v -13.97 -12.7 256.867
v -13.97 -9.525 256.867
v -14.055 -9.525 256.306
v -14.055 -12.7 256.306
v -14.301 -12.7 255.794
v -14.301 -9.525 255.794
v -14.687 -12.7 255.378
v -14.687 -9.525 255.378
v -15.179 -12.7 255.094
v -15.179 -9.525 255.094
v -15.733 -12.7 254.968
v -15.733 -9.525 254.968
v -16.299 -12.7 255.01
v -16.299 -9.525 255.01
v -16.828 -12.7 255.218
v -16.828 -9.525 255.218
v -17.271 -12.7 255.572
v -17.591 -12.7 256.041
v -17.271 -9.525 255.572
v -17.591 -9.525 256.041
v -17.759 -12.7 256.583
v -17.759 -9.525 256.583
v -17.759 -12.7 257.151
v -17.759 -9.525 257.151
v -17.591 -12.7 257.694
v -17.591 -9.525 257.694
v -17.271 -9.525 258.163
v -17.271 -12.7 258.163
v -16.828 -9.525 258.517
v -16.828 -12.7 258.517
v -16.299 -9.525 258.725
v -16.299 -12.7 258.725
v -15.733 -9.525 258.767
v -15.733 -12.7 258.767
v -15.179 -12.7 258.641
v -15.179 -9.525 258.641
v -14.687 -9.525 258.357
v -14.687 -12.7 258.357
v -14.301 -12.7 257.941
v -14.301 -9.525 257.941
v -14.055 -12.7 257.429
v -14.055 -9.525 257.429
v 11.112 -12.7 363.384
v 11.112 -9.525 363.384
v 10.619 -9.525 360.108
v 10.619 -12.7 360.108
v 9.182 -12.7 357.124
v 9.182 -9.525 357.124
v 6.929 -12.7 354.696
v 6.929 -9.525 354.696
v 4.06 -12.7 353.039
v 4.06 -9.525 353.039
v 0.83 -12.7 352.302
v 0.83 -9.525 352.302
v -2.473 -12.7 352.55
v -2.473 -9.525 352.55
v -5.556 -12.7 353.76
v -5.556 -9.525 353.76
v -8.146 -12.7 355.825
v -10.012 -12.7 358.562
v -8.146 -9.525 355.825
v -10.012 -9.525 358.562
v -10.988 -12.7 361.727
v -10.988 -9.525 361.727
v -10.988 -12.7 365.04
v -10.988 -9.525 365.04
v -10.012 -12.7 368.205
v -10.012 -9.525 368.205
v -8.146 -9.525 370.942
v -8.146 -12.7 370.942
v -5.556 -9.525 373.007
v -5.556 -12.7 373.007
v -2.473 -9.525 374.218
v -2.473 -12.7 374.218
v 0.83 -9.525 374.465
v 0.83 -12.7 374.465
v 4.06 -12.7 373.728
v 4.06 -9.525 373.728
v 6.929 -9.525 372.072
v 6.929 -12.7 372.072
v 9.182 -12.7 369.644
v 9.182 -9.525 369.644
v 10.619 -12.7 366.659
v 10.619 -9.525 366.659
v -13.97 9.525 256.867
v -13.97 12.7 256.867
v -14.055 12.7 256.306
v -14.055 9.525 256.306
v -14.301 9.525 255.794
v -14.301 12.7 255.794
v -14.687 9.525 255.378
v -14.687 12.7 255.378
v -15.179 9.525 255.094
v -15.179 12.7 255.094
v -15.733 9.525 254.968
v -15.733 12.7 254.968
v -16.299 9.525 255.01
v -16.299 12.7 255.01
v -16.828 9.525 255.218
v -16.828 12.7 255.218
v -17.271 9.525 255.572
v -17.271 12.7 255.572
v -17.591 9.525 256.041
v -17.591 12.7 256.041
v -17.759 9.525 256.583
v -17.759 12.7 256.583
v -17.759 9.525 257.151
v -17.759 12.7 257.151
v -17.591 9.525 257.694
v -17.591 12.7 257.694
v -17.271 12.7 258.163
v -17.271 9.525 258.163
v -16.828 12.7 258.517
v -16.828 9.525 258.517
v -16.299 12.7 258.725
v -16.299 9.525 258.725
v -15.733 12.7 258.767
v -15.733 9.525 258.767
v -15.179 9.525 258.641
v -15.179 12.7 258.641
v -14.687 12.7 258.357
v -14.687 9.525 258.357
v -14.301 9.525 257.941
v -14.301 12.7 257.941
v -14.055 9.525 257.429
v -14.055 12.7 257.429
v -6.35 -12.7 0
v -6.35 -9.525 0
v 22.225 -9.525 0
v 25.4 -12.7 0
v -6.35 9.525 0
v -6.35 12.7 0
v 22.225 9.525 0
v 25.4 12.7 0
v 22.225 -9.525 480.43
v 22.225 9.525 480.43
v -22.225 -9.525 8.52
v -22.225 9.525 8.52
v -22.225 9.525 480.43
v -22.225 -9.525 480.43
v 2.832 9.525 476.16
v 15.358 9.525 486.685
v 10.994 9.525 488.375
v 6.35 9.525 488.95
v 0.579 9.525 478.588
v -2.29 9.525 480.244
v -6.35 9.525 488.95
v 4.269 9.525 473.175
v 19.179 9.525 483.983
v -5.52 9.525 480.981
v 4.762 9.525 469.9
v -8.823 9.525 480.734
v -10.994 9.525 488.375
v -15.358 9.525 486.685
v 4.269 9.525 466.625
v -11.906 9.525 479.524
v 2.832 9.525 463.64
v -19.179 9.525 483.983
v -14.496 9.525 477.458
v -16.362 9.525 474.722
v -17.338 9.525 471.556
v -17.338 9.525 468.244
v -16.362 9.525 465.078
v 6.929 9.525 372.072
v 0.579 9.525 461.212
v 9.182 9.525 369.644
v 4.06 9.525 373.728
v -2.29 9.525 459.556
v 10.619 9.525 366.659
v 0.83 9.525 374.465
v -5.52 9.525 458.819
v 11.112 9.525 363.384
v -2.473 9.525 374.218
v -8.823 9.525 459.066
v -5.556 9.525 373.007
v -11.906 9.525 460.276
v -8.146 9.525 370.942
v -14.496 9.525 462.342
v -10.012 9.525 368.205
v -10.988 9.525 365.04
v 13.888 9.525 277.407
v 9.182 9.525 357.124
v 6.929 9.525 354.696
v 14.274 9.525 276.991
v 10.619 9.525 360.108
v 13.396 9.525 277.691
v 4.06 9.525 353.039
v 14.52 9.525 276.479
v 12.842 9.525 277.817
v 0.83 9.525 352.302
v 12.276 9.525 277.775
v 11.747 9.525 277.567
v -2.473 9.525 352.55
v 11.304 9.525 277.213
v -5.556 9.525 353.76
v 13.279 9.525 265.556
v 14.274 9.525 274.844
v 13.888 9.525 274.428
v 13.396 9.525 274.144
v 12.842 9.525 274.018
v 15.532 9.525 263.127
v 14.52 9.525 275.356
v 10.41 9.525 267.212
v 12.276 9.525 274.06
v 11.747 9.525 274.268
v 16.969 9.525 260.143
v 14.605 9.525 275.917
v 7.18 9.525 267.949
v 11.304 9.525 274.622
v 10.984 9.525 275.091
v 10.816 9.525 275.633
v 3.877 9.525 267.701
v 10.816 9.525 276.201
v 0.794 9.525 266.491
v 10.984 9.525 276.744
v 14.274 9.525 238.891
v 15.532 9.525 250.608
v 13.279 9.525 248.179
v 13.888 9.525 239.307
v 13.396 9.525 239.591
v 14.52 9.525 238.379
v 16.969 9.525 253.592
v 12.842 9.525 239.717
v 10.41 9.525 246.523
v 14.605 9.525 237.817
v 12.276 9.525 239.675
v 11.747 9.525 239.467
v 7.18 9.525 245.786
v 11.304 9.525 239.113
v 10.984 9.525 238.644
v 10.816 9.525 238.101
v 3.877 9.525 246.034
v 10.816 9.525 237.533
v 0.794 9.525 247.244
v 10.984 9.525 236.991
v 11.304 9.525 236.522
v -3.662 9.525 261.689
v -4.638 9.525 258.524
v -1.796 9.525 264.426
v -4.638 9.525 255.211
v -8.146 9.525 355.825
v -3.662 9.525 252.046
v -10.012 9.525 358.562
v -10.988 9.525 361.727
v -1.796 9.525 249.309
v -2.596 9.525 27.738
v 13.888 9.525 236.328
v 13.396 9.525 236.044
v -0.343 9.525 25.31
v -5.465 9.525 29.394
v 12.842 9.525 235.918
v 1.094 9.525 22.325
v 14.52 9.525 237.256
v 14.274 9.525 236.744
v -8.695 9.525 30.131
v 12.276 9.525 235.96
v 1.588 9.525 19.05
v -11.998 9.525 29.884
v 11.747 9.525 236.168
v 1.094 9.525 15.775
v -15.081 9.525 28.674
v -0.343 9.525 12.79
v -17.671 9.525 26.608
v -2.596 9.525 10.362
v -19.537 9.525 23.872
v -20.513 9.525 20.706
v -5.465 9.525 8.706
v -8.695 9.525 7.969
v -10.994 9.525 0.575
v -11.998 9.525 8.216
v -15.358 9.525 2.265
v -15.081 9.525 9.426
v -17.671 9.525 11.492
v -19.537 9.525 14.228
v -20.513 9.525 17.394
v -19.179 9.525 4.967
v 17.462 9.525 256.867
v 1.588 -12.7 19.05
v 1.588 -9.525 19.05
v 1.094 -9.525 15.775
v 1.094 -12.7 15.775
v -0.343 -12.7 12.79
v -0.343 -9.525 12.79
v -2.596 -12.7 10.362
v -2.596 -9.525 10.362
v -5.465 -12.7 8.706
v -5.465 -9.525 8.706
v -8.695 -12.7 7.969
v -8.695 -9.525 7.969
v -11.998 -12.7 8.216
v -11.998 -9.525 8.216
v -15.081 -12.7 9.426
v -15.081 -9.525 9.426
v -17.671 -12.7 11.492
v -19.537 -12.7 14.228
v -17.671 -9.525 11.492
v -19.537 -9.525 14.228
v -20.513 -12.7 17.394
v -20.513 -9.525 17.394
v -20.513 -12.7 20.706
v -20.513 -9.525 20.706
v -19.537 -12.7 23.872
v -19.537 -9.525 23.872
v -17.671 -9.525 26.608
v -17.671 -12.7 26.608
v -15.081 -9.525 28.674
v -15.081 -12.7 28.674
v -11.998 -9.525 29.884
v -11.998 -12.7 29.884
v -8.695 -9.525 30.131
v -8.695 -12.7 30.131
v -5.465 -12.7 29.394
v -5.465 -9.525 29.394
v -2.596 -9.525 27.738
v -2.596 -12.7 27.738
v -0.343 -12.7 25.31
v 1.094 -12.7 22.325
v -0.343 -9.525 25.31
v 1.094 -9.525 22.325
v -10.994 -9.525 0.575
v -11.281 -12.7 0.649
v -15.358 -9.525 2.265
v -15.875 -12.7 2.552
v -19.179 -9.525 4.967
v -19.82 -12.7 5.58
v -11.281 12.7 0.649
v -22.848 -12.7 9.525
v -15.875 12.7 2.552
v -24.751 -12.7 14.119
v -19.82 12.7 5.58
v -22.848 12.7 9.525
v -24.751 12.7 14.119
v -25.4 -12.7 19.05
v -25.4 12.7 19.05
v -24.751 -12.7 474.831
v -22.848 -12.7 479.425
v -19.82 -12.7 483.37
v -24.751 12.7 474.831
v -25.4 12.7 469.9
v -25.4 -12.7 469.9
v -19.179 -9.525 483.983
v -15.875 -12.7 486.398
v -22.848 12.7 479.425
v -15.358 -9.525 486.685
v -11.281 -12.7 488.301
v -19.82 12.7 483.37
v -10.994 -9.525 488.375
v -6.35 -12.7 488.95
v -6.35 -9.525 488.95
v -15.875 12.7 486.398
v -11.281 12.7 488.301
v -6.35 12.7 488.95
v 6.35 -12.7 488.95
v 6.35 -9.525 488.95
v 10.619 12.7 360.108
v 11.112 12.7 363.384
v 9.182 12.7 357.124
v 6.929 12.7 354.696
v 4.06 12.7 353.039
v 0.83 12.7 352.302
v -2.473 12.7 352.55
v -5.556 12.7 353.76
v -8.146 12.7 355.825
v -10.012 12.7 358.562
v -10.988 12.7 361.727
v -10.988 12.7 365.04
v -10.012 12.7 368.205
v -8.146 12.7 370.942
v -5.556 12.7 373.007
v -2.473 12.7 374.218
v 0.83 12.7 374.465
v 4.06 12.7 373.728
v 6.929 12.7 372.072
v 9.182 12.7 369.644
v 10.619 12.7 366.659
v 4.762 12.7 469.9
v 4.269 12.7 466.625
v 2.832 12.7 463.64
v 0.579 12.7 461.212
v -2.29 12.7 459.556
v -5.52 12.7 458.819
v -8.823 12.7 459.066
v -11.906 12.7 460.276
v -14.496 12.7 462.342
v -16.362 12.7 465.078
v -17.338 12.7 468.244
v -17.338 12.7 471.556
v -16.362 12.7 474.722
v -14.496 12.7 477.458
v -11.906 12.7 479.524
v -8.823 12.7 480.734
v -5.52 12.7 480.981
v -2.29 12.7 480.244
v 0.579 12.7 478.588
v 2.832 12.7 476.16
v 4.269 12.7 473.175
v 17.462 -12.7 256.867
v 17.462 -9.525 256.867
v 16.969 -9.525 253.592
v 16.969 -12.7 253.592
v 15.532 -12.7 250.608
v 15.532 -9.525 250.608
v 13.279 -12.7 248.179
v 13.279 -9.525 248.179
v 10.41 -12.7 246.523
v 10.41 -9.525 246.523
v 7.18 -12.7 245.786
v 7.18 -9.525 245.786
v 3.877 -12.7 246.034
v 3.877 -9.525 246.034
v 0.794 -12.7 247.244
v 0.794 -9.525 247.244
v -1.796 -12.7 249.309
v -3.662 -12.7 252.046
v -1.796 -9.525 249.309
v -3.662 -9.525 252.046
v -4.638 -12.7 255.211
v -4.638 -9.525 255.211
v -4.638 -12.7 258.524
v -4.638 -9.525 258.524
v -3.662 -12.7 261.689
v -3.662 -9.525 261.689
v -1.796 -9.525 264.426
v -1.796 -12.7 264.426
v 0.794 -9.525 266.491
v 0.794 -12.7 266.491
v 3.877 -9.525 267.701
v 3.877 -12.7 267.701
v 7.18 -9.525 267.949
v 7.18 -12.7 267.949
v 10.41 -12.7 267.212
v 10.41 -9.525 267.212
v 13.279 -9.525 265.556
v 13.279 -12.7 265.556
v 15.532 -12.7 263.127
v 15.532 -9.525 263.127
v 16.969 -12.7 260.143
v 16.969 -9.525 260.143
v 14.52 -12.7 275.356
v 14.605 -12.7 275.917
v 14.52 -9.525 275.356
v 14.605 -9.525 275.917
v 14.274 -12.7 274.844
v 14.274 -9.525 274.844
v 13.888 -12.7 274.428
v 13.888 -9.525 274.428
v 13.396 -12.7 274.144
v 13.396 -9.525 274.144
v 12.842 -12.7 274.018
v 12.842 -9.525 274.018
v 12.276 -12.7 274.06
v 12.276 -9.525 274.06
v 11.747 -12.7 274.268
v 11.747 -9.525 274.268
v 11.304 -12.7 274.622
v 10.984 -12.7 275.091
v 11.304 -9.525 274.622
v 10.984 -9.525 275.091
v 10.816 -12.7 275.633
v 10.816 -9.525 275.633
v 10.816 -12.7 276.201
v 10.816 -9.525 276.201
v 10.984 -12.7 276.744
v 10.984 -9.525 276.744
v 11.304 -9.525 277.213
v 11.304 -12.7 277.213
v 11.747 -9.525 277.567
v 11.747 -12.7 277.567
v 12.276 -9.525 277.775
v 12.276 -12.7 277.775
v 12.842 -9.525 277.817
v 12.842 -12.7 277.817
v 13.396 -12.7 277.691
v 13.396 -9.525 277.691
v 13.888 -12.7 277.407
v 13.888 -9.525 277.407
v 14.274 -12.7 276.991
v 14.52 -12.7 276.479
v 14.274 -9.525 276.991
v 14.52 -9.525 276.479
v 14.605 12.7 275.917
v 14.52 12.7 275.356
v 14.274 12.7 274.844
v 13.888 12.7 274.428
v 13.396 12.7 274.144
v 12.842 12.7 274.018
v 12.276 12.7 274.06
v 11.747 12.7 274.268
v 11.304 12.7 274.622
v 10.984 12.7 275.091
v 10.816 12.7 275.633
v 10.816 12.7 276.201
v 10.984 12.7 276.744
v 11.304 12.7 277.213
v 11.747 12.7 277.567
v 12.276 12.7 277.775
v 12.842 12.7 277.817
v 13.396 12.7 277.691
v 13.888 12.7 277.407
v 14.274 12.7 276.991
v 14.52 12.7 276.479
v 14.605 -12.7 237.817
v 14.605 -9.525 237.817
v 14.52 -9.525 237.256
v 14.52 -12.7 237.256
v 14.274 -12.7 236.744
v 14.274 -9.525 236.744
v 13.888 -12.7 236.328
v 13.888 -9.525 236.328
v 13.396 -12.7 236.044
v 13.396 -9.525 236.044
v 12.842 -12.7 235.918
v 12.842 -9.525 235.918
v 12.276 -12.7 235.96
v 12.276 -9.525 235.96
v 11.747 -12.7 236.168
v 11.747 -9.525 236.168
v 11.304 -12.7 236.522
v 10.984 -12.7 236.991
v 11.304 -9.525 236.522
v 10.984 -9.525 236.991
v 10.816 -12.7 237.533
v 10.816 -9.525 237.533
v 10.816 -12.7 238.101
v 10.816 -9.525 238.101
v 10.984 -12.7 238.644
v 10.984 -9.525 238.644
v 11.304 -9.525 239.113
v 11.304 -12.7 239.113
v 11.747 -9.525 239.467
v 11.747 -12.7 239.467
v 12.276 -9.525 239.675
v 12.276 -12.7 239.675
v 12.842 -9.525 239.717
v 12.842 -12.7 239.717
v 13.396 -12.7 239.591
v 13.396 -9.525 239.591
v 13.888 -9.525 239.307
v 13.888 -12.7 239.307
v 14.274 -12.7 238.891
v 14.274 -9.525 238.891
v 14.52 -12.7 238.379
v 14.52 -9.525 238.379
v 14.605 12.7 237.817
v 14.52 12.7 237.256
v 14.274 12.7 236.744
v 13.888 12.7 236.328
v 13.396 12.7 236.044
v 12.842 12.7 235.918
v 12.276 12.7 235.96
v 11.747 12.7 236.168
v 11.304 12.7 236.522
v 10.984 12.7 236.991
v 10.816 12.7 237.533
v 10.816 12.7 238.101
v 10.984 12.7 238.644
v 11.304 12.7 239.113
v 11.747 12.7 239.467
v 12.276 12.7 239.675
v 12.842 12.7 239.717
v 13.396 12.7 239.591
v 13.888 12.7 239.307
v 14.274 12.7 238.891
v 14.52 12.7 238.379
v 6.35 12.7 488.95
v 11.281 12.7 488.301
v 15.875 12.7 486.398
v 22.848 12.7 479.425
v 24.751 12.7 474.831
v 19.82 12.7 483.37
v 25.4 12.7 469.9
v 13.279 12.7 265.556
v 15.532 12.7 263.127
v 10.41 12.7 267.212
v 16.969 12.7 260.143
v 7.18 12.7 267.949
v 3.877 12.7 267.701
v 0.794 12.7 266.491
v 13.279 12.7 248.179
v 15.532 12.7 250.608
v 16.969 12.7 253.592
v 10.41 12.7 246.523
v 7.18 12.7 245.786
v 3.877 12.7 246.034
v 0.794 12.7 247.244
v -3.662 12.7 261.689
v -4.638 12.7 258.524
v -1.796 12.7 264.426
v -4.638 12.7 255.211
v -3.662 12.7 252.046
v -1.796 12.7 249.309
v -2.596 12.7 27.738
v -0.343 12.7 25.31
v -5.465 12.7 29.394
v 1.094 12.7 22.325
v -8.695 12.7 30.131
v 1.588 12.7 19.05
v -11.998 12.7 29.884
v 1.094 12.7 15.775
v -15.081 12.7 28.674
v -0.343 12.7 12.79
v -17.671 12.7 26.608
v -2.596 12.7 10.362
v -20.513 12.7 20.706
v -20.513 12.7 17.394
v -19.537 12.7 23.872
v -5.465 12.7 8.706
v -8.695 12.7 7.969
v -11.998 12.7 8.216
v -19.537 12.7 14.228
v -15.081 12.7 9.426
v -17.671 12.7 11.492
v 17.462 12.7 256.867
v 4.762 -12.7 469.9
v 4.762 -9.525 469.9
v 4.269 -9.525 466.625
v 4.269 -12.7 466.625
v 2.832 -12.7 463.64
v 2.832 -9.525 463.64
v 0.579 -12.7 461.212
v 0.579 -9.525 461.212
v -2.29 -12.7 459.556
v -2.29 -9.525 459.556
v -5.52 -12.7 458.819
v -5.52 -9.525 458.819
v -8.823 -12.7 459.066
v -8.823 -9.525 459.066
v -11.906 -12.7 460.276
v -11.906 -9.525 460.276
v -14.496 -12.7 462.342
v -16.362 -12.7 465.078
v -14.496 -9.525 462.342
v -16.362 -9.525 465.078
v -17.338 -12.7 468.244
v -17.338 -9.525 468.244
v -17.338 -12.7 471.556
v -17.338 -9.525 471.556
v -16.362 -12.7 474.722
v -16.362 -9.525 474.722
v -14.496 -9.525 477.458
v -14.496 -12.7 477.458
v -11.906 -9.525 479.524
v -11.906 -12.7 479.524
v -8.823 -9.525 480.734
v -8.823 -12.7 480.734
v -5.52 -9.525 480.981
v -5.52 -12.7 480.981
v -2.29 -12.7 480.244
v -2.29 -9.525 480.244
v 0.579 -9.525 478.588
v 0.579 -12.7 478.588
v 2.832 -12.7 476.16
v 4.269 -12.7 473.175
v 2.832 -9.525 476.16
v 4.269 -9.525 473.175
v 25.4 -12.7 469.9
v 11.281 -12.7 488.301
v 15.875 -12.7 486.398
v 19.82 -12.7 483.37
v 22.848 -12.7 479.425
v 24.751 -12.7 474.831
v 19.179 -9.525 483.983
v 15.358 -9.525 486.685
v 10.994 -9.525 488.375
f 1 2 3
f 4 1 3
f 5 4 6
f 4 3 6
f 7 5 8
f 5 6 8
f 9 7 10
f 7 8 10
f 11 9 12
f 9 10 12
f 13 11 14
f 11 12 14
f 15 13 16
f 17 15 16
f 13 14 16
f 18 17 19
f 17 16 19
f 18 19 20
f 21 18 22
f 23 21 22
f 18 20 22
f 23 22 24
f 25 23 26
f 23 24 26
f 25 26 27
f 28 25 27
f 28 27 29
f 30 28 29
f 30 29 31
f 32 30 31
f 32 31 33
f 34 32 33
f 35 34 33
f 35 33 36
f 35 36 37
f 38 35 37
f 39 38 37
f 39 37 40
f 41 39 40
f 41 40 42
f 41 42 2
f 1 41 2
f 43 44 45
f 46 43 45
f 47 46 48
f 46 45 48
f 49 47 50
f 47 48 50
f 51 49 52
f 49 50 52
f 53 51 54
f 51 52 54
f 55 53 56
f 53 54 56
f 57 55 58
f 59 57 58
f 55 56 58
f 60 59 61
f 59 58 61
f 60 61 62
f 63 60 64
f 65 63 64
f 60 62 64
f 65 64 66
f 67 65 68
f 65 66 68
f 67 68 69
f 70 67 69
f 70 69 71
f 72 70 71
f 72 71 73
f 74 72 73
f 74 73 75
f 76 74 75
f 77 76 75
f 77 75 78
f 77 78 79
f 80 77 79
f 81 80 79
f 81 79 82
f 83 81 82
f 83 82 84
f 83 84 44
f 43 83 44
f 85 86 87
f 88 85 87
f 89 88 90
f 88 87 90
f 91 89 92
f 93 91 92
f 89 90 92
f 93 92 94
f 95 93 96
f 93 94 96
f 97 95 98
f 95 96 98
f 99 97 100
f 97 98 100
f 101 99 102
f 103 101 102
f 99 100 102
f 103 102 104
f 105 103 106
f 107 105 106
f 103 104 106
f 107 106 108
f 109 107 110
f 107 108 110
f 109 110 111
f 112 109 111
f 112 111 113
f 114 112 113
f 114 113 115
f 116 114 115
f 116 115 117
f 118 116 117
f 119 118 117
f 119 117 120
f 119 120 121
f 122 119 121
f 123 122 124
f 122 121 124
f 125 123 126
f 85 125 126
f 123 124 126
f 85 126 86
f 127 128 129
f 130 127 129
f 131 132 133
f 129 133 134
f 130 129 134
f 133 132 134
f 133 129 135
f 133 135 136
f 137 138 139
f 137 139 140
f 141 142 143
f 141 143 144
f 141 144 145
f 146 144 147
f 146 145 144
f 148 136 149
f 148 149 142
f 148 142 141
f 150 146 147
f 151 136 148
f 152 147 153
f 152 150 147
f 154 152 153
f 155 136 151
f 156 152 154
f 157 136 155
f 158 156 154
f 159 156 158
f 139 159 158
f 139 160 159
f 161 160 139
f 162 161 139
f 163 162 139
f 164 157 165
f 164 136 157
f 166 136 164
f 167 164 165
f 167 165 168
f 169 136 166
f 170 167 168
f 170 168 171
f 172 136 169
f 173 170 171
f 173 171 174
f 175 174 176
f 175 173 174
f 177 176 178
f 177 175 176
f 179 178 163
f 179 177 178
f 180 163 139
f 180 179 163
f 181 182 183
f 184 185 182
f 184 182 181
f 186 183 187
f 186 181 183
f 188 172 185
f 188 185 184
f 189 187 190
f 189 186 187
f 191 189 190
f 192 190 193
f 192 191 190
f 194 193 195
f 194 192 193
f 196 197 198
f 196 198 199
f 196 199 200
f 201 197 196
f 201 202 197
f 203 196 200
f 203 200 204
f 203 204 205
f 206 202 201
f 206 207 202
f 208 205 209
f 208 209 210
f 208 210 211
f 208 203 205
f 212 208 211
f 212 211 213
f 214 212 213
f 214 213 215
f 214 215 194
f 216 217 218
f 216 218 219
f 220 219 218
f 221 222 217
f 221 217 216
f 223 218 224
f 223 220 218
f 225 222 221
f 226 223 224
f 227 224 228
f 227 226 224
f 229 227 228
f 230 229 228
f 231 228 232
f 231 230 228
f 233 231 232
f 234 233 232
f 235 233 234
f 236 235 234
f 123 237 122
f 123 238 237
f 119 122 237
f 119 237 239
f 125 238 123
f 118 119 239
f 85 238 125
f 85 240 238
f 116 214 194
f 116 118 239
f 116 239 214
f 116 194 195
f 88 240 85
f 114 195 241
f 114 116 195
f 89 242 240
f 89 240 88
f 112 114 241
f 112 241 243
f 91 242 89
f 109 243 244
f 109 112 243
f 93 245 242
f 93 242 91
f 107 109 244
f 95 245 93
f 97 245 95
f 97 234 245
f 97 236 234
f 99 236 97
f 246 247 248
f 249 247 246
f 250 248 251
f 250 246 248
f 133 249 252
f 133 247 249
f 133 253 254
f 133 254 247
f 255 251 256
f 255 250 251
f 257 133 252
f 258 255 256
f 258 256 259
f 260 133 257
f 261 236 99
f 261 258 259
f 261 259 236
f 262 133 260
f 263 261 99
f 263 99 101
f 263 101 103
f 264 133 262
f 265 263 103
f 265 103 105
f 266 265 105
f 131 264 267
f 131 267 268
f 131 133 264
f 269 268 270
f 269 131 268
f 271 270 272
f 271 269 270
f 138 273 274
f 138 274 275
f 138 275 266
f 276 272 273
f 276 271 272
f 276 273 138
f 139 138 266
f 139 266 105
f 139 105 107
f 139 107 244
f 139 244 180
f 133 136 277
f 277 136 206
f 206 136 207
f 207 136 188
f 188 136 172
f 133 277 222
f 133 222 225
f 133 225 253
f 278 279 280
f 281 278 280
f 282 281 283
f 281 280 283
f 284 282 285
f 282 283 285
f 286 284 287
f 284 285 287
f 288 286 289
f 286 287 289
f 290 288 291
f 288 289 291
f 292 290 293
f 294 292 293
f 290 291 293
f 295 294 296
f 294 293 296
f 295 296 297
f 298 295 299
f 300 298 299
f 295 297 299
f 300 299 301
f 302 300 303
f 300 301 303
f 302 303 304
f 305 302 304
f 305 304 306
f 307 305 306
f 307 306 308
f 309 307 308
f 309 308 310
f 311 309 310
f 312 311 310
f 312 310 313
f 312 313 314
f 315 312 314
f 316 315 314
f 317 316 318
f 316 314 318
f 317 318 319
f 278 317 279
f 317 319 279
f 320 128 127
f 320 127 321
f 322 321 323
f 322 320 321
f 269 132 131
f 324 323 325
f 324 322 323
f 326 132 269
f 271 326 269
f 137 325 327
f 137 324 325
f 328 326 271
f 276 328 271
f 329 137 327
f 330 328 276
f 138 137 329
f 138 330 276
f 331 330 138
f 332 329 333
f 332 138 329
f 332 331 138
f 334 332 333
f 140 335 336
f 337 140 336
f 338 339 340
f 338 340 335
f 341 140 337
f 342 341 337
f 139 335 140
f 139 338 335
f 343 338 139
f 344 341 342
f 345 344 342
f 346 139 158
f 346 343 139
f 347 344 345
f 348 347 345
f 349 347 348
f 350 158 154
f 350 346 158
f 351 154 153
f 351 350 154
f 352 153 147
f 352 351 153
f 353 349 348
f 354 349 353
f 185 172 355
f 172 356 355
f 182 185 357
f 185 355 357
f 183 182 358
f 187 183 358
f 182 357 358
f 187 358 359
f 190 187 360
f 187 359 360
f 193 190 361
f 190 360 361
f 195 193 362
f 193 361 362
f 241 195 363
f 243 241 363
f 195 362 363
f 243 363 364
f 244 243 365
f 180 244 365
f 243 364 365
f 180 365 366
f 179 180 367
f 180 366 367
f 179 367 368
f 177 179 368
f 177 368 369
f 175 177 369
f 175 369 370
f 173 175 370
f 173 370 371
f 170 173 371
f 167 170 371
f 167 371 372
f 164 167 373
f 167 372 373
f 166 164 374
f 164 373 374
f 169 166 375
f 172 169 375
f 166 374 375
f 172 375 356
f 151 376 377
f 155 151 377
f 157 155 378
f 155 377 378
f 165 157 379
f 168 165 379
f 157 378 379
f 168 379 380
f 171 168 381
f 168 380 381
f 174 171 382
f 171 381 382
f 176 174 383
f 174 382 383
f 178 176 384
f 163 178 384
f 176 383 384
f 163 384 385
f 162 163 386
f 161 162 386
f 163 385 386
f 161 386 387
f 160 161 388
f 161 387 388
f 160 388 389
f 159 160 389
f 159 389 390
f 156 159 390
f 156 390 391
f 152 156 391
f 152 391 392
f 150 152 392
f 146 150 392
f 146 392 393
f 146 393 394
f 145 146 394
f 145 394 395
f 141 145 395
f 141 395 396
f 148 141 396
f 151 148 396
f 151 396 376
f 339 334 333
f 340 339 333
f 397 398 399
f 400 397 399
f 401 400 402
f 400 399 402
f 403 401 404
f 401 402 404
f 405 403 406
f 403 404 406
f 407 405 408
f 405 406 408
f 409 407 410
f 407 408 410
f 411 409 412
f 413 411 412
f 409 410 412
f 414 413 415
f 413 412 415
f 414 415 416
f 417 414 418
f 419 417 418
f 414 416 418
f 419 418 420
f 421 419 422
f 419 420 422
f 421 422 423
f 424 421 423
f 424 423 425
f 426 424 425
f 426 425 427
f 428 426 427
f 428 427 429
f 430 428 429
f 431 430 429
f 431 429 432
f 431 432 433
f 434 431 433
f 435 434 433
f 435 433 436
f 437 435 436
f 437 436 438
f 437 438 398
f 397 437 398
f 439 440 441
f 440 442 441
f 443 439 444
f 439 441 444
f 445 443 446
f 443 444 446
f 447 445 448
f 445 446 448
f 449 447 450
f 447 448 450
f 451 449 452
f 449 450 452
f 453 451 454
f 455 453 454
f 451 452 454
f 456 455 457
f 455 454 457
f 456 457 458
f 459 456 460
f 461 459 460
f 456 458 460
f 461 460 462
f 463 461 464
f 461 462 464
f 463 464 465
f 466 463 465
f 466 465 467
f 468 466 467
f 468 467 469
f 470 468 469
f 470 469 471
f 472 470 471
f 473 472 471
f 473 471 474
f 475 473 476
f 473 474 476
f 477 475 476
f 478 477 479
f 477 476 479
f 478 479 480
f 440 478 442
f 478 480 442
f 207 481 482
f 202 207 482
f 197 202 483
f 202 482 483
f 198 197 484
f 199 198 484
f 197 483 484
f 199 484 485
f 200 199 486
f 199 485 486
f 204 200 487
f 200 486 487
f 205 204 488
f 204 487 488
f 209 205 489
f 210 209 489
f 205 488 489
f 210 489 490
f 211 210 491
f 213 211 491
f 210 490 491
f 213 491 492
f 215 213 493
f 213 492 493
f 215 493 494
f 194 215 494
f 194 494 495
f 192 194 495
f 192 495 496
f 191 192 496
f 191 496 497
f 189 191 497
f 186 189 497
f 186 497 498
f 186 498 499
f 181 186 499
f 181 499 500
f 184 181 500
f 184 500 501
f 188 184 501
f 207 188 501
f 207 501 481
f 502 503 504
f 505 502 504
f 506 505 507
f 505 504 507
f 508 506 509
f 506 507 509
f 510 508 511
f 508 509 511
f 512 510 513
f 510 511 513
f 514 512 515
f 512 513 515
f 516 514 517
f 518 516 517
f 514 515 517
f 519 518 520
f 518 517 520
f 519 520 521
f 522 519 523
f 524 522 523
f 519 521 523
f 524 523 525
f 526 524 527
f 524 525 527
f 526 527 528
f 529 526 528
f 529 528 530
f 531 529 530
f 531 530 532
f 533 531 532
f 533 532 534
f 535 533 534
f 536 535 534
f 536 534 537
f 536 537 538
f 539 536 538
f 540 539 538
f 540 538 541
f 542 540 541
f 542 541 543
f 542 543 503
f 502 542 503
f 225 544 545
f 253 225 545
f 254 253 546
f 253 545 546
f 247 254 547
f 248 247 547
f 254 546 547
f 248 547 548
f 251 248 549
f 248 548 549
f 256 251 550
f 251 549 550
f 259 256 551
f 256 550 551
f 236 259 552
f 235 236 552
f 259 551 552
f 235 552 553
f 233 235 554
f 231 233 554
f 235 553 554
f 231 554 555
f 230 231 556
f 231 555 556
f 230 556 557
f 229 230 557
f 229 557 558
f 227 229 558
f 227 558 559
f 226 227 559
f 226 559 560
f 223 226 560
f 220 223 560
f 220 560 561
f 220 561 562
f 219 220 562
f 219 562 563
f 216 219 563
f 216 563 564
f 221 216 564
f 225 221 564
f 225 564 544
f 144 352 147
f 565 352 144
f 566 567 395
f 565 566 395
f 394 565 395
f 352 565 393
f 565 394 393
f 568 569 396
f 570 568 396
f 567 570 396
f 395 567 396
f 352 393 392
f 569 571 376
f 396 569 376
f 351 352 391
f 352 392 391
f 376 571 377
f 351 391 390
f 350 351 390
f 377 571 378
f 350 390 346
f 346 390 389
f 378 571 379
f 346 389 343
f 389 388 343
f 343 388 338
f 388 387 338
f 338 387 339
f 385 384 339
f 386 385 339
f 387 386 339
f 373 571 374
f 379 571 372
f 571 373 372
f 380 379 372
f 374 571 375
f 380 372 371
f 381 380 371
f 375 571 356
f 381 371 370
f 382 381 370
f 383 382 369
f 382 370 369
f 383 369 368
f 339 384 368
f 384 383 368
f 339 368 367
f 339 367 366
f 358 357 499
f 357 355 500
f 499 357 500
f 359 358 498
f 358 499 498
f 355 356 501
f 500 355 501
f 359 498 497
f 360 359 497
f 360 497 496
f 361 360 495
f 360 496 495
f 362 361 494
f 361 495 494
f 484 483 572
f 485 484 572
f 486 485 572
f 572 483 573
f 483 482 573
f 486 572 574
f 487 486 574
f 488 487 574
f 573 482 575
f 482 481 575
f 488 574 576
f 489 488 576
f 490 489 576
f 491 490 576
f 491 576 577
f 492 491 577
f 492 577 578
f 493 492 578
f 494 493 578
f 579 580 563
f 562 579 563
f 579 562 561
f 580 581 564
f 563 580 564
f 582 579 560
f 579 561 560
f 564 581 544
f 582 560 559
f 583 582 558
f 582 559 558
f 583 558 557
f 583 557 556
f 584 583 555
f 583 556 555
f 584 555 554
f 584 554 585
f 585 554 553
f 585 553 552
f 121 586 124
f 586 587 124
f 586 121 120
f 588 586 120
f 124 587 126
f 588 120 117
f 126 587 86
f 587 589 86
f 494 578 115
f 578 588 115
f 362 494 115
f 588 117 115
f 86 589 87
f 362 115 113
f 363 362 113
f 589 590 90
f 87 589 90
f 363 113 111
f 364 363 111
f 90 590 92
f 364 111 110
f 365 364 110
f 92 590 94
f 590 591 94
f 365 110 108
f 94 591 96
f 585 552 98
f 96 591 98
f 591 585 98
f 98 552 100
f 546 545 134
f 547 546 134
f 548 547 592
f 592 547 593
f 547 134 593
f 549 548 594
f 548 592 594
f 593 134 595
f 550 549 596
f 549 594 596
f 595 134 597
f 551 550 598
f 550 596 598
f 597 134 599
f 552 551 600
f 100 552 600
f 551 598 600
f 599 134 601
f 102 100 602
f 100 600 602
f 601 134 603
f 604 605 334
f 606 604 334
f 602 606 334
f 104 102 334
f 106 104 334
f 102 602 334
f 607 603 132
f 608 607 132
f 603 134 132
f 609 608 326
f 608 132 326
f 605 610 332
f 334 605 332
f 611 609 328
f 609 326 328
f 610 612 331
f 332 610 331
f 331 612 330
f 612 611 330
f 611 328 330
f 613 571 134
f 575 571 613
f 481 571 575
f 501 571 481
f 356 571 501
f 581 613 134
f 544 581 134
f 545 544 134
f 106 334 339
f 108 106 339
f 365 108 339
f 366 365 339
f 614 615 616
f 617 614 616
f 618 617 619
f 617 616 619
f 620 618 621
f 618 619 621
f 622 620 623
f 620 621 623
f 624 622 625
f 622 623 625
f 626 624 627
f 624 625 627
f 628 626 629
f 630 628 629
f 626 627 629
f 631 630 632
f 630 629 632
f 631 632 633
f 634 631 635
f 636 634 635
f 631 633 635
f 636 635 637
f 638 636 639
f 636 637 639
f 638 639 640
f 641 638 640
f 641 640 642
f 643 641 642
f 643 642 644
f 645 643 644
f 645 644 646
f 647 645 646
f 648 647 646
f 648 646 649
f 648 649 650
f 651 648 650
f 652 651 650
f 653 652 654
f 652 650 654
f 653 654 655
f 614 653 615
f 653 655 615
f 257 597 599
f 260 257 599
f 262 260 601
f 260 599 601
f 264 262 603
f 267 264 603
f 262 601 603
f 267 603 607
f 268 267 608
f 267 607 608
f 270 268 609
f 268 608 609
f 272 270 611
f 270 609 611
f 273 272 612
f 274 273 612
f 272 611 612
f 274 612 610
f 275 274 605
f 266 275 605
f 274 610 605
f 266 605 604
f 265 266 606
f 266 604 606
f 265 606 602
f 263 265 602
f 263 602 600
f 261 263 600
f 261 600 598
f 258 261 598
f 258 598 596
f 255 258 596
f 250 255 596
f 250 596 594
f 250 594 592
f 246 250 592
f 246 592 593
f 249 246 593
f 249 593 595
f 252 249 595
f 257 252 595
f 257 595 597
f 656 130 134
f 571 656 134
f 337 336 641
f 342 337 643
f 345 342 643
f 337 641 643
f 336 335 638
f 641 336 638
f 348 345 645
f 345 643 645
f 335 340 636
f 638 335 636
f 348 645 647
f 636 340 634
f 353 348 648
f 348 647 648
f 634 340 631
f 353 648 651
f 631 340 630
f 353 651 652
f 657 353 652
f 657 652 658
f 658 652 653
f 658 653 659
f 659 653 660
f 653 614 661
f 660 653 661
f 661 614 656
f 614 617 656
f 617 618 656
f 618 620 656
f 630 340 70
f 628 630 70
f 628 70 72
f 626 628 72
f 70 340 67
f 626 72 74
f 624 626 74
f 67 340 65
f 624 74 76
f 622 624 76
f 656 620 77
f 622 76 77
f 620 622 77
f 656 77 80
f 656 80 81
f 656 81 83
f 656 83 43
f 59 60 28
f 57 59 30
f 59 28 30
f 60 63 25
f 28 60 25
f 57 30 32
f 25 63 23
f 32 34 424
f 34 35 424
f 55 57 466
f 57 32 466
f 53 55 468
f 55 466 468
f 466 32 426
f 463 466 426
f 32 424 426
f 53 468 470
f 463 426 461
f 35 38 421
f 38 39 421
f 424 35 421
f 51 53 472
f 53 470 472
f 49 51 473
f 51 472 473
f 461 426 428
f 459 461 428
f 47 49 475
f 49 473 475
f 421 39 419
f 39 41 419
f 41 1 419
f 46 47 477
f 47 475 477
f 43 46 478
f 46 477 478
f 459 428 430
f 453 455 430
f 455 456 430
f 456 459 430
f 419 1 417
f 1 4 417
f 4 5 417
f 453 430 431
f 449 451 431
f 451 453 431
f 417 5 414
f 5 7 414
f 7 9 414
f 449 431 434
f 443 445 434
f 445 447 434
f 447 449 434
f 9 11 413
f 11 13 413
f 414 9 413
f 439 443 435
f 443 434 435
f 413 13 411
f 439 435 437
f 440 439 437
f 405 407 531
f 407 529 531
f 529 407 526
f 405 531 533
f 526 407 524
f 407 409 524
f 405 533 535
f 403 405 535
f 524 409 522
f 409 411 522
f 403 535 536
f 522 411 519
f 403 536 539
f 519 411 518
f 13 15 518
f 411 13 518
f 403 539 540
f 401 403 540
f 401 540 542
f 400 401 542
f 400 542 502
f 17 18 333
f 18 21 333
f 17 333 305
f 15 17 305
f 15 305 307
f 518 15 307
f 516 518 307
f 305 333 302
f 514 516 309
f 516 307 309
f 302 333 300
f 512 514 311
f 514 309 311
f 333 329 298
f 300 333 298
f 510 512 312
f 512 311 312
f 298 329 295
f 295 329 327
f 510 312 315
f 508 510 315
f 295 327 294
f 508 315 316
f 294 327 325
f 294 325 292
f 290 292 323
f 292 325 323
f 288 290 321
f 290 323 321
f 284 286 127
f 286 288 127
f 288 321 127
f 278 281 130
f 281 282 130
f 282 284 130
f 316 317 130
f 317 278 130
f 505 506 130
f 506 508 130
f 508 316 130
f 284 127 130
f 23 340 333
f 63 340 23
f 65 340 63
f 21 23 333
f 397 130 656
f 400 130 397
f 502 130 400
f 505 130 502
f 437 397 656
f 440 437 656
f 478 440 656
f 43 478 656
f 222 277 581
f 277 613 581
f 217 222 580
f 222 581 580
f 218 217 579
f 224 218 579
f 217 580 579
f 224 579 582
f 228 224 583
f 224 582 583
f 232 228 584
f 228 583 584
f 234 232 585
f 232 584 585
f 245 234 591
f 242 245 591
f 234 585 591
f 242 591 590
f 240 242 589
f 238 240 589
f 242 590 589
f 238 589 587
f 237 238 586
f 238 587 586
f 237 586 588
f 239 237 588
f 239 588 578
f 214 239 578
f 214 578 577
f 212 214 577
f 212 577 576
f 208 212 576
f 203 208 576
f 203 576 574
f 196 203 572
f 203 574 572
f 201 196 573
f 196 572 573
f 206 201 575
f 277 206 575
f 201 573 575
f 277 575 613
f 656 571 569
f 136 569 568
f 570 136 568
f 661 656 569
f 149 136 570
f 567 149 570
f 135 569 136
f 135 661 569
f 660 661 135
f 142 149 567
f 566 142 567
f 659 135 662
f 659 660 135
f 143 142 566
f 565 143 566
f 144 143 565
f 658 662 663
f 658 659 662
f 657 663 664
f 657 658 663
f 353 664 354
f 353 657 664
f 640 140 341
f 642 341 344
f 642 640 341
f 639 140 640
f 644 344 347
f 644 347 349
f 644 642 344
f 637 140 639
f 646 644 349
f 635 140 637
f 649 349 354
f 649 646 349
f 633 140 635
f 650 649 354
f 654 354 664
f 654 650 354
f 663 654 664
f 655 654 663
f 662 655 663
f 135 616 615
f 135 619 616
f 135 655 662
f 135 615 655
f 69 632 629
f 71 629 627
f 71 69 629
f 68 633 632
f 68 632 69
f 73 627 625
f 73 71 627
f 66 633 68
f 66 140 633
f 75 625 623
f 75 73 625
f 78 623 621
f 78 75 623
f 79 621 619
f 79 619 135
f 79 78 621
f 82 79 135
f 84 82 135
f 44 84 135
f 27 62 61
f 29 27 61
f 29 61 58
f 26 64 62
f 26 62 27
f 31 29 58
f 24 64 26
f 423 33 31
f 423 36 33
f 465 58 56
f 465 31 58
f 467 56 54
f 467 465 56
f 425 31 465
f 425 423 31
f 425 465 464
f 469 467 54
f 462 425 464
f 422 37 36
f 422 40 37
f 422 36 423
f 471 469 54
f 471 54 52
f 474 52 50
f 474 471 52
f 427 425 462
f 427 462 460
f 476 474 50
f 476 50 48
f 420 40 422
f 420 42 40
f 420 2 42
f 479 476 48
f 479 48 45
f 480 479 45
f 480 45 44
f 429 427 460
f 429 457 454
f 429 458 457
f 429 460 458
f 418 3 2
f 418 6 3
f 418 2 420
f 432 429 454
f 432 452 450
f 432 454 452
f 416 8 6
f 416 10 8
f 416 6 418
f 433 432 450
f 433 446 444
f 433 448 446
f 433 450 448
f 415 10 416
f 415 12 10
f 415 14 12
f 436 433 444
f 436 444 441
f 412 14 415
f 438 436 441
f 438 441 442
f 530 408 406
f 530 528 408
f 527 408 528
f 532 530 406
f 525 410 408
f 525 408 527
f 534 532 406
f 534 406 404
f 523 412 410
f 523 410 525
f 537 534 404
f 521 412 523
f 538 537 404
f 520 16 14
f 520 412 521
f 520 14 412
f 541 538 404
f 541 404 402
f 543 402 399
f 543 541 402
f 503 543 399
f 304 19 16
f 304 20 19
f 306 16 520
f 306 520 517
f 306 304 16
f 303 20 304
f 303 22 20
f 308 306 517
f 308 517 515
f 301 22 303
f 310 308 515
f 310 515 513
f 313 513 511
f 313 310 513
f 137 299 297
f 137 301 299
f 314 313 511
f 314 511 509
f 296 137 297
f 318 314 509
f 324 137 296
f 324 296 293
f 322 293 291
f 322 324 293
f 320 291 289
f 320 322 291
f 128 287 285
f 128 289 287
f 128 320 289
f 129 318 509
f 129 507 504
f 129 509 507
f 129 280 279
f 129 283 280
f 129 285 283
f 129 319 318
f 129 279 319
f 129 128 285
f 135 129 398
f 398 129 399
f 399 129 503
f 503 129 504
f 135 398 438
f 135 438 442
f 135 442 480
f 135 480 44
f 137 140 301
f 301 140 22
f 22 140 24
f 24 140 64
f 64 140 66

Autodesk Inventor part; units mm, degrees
ref_plane "YZ Plane" through (0, 0, 0) normal (1, 0, 0) x (0, 1, 0)
ref_plane "XZ Plane" through (0, 0, 0) normal (0, 1, 0) x (-1, 0, 0)
ref_plane "XY Plane" through (0, 0, 0) normal (0, 0, 1) x (1, 0, 0)
sketch "Sketch1" plane through (0, 0, 0) normal (0, 0, 1) x (1, 0, 0)
  line L0 (-25.4, -12.7) -> (25.4, -12.7)
  line L1 (25.4, -12.7) -> (25.4, 12.7)
  line L2 (25.4, 12.7) -> (-25.4, 12.7)
  line L3 (-25.4, 12.7) -> (-25.4, -12.7)
  line L4 (-25.4, -12.7) -> (25.4, 12.7) construction
  line L5 (25.4, -12.7) -> (-25.4, 12.7) construction
  line L6 (-22.225, -9.525) -> (22.225, -9.525)
  line L7 (22.225, -9.525) -> (22.225, 9.525)
  line L8 (22.225, 9.525) -> (-22.225, 9.525)
  line L9 (-22.225, 9.525) -> (-22.225, -9.525)
  line L10 (-22.225, -9.525) -> (22.225, 9.525) construction
  line L11 (22.225, -9.525) -> (-22.225, 9.525) construction
  line L12 (0, 9.525) -> (0, 12.7) construction
  line L13 (22.225, 0) -> (25.4, 0) construction
  point P0 (0, 0)
  dimension "d0" = 25.4
  dimension "d1" = 50.8
  dimension "d2" = 3.175
extrude "Extrusion1" add sketch "Sketch1" along normal blind 488.95
sketch "Sketch2" plane through (-25.4, 12.7, 0) normal (0, 1, 0) x (1, 0, 0)
  circle A0 centre (19.05, -469.9) radius 11.1125
  circle A1 centre (31.75, -256.8674) radius 11.1125
  circle A2 centre (25.4, -363.3837) radius 11.1125
  circle A3 centre (15.875, -19.05) radius 11.1125
  line L0 (0, 0) -> (0, -488.95) construction
  line L1 (3.175, 0) -> (3.175, -488.95) construction
  line L2 (50.8, 0) -> (50.8, -488.95) construction
  line L3 (15.875, -19.05) -> (24.1367, -26.4818) construction
  line L4 (19.05, -469.9) -> (31.75, -256.8674) construction
  line L5 (50.8, -488.95) -> (0, -488.95) projected
  line L6 (47.625, 0) -> (47.625, -488.95) construction
  circle A4 centre (38.1, -237.8174) radius 1.905
  circle A5 centre (38.1, -275.9174) radius 1.905
  circle A6 centre (9.525, -256.8674) radius 1.905
  line L7 (38.1, -237.8174) -> (38.1, -275.9174) construction
  line L8 (9.525, -256.8674) -> (47.625, -256.8674) construction
  circle A7 centre (31.75, -256.8674) radius 14.2875 construction
  circle A8 centre (19.05, -469.9) radius 14.2875 construction
  circle A9 centre (31.75, -256.8674) radius 14.2875 construction
  circle A10 centre (15.875, -19.05) radius 14.2875 construction
  point P0 (25.4, -363.3837)
  point P1 (38.1, -256.8674)
  dimension "d10" = 22.225
  dimension "d5" = 22.225
  dimension "d16" = 19.05
  dimension "d17" = 19.05
  dimension "d20" = 19.05
  dimension "d21" = 15.875
  dimension "d23" = 19.05
  dimension "d24" = 38.1
  dimension "d27" = 28.575
  dimension "d28" = 3.81
  dimension "d29" = 22.225
  dimension "d31" = 106.7054
  dimension "d32" = 28.575
  dimension "d34" = 6.35
extrude "Extrusion2" cut sketch "Sketch2" against normal through all
fillet "Fillet1" radius 19.05 3 edges at (-25.4, 0, 0) (-25.4, 0, 488.95) (25.4, 0, 488.95)
properties part number "arm" material "Aluminum 6061"
